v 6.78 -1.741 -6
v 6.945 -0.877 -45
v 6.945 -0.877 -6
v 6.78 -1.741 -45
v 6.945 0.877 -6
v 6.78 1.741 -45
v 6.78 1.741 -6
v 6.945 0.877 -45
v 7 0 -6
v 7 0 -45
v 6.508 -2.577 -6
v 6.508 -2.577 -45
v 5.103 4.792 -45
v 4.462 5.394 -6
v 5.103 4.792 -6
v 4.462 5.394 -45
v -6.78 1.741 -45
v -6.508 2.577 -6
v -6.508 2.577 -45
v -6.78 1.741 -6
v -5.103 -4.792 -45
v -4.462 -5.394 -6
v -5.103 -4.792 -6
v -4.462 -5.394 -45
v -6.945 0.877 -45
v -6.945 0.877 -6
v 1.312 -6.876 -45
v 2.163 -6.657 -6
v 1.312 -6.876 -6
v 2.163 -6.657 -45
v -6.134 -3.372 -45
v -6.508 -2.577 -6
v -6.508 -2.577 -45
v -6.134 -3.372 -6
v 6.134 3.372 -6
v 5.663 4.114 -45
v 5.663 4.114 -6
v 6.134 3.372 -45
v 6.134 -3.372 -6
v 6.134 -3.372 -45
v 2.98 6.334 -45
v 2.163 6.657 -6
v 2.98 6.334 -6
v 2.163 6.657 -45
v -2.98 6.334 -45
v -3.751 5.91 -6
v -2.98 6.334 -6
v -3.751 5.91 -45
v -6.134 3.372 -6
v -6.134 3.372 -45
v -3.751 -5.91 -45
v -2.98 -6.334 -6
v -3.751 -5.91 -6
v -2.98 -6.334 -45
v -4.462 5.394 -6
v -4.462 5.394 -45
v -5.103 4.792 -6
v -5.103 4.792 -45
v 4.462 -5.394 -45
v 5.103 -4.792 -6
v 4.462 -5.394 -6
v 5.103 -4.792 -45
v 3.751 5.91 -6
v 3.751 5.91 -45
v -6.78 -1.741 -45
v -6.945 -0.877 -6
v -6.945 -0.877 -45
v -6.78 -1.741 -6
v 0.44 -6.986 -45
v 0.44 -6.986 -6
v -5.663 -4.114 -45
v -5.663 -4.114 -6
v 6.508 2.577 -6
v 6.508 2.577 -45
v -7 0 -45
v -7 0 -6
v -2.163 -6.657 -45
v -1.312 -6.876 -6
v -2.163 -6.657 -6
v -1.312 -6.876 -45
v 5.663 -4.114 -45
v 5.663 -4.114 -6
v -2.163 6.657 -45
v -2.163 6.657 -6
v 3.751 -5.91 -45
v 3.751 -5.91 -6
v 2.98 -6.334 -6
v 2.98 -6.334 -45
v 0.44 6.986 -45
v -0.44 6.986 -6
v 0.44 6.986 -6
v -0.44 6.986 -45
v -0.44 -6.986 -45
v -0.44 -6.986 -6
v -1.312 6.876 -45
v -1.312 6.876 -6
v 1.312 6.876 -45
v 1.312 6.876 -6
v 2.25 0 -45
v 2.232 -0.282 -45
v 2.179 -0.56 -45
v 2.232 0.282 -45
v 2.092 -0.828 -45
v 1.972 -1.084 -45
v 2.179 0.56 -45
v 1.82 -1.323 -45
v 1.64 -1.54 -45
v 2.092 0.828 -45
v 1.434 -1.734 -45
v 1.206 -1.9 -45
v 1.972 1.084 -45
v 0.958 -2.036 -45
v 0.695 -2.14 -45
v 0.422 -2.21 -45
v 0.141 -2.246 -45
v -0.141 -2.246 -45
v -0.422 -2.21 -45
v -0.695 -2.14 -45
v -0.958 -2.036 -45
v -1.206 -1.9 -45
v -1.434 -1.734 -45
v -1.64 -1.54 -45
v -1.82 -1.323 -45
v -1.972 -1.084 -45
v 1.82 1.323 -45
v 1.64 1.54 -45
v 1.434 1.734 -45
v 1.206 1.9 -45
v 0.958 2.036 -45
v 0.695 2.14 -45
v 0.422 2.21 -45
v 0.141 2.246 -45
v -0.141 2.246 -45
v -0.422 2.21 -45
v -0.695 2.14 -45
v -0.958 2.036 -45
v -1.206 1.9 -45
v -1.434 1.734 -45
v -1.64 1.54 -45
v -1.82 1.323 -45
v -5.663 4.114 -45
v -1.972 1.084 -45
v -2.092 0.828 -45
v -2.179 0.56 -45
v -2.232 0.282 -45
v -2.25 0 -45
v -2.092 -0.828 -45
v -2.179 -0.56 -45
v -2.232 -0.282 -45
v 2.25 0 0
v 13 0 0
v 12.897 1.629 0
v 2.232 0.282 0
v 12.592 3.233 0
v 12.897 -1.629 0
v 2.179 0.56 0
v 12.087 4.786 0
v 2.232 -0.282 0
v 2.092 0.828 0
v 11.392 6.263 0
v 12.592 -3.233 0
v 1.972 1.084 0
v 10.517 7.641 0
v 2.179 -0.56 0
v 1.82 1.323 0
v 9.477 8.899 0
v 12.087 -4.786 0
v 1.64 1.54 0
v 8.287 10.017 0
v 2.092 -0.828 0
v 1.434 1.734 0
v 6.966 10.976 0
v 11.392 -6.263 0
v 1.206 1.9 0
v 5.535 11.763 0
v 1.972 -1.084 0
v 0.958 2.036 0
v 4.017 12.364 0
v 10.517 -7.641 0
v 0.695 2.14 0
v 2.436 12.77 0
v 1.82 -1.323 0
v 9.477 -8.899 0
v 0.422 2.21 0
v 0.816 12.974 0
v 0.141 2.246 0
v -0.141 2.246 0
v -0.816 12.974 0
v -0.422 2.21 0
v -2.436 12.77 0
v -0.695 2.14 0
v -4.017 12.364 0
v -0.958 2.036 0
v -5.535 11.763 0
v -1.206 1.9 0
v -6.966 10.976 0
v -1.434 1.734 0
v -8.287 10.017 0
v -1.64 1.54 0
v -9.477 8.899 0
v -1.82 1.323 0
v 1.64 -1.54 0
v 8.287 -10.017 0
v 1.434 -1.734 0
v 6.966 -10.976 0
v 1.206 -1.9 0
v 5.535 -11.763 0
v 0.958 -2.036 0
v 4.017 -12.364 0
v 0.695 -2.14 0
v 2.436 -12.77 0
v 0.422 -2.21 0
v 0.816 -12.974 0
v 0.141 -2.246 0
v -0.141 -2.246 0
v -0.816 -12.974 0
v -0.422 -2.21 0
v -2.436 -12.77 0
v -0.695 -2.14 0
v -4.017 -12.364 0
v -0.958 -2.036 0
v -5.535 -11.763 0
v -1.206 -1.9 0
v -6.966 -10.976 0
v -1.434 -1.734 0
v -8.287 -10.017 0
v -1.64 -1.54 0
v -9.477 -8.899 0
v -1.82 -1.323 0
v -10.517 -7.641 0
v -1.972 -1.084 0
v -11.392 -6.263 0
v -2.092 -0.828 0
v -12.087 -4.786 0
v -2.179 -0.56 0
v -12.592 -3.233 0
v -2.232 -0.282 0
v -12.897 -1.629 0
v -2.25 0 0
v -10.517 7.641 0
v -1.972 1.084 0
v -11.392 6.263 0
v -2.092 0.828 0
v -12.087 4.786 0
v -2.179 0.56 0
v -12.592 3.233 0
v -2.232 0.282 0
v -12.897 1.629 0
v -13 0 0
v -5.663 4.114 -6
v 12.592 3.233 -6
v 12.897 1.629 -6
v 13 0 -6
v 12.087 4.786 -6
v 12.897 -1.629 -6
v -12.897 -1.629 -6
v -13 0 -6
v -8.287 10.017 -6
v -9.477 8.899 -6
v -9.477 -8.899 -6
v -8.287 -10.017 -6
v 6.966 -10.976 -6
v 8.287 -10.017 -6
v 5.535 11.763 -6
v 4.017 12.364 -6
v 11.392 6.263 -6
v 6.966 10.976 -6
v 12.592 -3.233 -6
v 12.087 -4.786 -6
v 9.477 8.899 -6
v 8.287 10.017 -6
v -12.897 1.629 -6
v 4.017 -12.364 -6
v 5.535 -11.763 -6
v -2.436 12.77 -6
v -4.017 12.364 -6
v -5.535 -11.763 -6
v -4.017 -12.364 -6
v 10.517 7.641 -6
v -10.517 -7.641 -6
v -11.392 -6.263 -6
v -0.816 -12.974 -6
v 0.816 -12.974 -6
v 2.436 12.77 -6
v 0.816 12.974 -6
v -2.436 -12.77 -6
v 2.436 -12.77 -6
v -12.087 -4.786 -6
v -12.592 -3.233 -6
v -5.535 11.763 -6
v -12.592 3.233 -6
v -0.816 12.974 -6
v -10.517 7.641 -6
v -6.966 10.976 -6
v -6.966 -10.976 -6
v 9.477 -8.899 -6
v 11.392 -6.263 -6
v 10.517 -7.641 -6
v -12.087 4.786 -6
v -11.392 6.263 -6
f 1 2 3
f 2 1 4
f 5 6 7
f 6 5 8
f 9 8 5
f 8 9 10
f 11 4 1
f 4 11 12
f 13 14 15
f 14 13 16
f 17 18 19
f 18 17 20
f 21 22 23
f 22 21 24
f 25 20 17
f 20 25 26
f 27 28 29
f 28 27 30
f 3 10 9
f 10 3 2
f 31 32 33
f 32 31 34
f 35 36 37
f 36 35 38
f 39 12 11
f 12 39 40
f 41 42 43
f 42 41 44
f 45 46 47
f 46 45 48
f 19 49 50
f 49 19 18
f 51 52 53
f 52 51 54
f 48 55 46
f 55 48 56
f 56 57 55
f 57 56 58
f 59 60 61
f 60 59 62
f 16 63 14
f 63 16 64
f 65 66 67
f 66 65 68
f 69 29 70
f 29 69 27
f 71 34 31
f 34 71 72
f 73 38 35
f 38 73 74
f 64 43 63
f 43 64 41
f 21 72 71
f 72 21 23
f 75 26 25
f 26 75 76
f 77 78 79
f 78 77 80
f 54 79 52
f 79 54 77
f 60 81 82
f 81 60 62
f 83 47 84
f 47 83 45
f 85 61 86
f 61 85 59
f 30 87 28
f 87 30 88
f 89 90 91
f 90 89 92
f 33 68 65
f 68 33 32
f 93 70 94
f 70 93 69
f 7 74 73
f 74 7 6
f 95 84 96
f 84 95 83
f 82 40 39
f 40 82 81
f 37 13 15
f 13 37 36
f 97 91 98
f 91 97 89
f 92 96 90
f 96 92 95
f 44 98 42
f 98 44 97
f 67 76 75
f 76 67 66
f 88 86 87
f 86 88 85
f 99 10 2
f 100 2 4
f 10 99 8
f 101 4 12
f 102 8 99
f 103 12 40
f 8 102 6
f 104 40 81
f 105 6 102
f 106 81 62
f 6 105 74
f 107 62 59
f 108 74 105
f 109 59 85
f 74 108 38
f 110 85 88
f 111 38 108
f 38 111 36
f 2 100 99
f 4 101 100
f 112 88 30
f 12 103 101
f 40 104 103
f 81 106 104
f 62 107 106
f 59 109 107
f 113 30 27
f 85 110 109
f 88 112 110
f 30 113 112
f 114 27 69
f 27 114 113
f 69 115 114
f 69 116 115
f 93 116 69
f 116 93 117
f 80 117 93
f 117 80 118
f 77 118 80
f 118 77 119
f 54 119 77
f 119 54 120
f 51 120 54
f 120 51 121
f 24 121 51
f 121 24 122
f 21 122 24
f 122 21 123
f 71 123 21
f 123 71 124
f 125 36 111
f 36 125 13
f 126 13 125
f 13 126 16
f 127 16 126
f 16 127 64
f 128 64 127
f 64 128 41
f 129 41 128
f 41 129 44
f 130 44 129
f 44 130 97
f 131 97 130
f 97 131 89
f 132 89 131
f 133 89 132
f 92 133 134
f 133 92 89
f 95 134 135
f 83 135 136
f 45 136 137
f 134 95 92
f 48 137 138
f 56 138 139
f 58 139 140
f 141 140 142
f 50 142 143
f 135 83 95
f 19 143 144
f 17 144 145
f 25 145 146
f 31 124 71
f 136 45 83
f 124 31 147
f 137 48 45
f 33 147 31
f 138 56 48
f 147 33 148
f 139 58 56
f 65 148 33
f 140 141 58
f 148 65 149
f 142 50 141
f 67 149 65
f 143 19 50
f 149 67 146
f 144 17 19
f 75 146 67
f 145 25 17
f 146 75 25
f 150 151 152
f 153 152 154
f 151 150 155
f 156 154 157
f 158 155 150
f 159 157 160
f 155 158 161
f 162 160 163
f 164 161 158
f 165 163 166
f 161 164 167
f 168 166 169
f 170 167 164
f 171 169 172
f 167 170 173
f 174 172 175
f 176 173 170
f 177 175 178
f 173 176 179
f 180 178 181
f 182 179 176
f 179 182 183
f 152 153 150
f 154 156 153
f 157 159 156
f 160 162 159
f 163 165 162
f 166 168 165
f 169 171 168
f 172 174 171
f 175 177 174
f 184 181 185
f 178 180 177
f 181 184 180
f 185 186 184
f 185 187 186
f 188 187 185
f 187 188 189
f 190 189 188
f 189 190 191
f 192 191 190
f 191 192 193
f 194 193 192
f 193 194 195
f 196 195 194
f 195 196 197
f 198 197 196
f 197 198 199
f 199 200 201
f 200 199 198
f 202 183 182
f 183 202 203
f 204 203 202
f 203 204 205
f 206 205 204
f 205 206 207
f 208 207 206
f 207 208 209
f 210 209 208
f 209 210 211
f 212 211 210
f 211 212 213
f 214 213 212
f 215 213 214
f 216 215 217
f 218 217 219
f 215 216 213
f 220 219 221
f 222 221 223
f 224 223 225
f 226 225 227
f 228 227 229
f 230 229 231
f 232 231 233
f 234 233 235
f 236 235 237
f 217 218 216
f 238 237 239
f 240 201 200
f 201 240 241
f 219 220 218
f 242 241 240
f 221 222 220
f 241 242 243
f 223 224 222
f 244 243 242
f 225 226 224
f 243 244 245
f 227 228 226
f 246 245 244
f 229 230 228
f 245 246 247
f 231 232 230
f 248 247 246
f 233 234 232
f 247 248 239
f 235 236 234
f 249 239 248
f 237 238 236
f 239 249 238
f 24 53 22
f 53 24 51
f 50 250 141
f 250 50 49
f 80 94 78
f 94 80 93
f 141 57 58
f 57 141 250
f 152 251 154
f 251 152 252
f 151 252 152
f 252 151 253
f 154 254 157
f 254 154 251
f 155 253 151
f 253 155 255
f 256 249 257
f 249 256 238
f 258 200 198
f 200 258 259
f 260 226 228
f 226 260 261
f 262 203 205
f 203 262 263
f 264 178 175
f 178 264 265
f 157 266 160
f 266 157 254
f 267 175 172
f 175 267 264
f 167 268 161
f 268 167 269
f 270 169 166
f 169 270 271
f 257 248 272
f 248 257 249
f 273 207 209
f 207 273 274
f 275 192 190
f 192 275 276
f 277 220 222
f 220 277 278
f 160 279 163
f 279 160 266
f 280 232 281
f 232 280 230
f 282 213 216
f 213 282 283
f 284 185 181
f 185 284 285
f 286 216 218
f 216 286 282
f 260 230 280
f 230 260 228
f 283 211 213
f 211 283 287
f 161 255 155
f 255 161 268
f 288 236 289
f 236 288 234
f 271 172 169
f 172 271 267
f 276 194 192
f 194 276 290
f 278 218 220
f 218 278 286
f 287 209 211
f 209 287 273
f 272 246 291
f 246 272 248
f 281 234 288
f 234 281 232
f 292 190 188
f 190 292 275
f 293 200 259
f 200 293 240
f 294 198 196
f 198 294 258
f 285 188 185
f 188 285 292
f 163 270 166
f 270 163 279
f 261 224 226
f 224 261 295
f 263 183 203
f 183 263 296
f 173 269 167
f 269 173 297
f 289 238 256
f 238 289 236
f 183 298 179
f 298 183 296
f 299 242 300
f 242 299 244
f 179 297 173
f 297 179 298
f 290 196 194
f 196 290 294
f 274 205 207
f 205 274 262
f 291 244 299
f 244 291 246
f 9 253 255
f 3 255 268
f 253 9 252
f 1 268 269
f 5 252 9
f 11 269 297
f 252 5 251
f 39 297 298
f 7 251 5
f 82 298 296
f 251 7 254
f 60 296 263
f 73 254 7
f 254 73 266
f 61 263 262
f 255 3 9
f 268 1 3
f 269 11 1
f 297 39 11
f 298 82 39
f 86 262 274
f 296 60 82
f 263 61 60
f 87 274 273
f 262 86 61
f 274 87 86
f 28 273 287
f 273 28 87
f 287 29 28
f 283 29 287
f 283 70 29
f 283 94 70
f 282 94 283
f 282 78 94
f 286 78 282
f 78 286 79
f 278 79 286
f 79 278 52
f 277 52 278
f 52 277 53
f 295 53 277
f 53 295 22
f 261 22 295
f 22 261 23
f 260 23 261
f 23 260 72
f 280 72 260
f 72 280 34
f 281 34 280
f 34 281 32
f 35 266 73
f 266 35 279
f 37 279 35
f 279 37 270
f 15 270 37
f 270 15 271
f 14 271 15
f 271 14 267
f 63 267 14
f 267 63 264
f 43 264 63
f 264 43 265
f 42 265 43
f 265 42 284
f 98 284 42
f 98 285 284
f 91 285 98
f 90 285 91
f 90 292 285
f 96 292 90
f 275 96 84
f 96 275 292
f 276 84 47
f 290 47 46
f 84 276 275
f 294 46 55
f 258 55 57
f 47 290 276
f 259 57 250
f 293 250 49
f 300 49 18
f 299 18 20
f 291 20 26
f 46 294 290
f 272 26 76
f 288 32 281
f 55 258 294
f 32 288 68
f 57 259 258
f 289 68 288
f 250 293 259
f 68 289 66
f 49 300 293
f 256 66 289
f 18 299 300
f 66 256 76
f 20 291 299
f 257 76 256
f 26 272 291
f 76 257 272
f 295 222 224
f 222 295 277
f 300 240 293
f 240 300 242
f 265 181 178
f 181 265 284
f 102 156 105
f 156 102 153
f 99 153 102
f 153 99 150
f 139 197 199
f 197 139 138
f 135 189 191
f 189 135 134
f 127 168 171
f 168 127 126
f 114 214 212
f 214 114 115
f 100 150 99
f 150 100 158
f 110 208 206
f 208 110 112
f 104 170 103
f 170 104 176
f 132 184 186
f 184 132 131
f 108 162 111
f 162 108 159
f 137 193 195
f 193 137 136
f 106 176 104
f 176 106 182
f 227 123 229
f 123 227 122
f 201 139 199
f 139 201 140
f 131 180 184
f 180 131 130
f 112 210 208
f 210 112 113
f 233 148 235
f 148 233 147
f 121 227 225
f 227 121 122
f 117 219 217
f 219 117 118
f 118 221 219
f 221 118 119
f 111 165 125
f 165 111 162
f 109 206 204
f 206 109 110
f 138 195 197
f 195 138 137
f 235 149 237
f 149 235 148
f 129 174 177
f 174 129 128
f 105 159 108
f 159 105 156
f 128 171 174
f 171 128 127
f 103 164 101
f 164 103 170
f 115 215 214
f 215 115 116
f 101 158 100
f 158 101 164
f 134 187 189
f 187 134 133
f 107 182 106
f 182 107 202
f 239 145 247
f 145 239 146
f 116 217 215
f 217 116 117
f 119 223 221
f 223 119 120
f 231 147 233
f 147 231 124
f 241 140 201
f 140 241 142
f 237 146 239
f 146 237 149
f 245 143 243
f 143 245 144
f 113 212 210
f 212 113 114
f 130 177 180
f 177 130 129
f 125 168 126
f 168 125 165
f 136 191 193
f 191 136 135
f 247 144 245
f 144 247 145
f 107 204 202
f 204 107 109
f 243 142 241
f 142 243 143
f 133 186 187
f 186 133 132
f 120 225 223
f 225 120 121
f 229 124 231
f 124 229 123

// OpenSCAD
$fn = 50;


difference() {
	union() {
		translate(v = [0, 0, -45.0000000000]) {
			cylinder(h = 45, r = 7.0000000000);
		}
		translate(v = [0, 0, -6.0000000000]) {
			cylinder(h = 6, r = 13.0000000000);
		}
	}
	union() {
		#translate(v = [0, 0, -45]) {
			cylinder(h = 45, r = 2.2500000000);
		}
	}
}
